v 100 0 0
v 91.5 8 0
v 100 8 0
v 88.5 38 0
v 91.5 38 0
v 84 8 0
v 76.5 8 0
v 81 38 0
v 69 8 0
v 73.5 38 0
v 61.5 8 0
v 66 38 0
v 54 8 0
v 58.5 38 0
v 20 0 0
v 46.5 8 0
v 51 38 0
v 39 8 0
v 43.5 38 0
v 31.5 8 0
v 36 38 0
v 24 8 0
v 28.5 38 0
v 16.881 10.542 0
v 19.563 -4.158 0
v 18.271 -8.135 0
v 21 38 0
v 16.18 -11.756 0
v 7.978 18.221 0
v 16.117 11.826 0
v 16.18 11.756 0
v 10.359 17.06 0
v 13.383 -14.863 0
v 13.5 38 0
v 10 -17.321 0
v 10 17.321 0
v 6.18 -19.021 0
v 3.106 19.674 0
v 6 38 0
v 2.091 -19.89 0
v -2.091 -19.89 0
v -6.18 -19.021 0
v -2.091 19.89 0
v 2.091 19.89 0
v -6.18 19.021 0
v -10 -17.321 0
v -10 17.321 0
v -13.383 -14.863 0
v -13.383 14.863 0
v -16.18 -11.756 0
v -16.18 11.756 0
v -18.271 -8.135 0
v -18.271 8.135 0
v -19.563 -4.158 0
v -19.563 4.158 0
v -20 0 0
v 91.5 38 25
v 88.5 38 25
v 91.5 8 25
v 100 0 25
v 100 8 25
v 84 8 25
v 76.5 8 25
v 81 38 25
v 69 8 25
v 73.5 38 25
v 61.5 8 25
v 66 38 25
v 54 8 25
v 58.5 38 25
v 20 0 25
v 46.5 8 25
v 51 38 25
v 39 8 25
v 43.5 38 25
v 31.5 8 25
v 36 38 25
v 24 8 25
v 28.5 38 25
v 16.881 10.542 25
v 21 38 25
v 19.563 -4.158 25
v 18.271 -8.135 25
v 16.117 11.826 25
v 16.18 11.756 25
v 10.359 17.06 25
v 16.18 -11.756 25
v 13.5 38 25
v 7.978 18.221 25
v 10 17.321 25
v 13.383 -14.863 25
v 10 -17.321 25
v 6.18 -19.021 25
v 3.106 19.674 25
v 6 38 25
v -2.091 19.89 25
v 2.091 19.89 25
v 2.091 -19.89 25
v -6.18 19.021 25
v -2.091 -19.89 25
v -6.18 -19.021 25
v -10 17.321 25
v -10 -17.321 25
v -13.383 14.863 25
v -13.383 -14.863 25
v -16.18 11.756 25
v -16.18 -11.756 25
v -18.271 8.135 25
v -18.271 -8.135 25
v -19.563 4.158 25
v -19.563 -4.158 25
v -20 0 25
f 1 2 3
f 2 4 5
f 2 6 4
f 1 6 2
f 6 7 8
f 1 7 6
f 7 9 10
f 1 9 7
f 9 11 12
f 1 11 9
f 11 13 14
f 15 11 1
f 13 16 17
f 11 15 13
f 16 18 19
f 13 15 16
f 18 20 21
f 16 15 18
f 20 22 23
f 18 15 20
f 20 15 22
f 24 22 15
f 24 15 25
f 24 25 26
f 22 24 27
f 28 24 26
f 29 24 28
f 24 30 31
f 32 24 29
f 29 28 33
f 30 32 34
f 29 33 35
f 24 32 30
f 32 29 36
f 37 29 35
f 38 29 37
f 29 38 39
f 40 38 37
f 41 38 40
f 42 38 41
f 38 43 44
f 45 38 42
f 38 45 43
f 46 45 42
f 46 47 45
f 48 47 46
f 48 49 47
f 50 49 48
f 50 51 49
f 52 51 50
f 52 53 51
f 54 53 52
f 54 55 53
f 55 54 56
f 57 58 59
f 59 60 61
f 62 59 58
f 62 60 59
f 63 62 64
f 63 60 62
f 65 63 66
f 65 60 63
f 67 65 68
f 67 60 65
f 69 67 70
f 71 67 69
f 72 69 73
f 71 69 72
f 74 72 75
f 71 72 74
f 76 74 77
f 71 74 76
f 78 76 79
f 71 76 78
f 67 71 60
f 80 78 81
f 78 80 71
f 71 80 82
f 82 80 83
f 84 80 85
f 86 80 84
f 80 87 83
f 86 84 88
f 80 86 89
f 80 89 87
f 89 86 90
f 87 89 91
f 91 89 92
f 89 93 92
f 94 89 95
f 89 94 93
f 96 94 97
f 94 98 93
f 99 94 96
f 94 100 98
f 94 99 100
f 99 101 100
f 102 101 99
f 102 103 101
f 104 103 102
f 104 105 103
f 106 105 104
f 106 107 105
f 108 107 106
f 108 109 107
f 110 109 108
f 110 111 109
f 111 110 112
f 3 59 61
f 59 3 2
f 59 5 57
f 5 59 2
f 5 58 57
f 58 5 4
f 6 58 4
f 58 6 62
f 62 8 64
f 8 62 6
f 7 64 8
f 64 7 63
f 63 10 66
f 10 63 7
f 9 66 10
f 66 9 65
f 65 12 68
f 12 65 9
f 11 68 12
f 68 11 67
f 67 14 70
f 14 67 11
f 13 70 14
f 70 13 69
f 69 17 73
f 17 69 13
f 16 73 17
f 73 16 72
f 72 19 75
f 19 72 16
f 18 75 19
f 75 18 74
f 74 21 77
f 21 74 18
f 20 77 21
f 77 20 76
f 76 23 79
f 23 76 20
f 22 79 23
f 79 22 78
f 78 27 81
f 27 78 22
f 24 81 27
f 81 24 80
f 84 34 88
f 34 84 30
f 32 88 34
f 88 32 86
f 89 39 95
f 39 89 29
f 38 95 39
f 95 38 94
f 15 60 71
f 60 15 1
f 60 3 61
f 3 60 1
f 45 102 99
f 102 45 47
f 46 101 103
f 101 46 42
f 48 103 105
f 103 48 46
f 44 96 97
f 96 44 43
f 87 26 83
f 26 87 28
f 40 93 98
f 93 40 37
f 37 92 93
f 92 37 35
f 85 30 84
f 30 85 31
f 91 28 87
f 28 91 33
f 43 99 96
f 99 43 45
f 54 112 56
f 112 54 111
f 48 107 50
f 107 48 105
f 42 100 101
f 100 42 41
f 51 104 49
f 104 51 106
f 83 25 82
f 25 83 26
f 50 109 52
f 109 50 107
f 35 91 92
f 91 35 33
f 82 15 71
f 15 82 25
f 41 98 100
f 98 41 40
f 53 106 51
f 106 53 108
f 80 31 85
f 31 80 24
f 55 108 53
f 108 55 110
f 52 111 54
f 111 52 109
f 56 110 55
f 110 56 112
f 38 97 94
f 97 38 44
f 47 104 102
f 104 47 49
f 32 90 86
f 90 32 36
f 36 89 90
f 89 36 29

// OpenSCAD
// DXF drawing to OpenSCAD

polygon = [
  [0, 0], [100, 0], [100, 8], [91.5, 8], [91.5, 38], [88.5, 38], [88.5, 38], [84, 8], [84, 8], [81, 38], [81, 38], [76.5, 8], [76.5, 8], [73.5, 38], [73.5, 38], [69, 8], [69, 8], [66, 38], [66, 38], [61.5, 8], [61.5, 8], [58.5, 38], [58.5, 38], [54, 8], [54, 8], [51, 38], [51, 38], [46.5, 8], [46.5, 8], [43.5, 38], [43.5, 38], [39, 8], [39, 8], [36, 38], [36, 38], [31.5, 8], [31.5, 8], [28.5, 38], [28.5, 38], [24, 8], [24, 8], [21, 38], [21, 38], [16.5, 8], [16.5, 8], [13.5, 38], [13.5, 38], [9, 8], [9, 8], [6, 38], [6, 38], [0, 0]
];

circle1 = [
  [10, 10],
  [10, 90],
  [90, 90],
  [90, 10],
  [10, 10]
];

circle2 = [
  [10, 10],
  [10, 90],
  [90, 90],
  [90, 10],
  [10, 10]
];

module extrude_polygon() {
  linear_extrude(height = 25) {
    polygon(points = polygon);
  }
}

module extrude_circle() {
  linear_extrude(height = 25) {
    circle(d = 40);
  }
}

extrude_polygon();
extrude_circle();
